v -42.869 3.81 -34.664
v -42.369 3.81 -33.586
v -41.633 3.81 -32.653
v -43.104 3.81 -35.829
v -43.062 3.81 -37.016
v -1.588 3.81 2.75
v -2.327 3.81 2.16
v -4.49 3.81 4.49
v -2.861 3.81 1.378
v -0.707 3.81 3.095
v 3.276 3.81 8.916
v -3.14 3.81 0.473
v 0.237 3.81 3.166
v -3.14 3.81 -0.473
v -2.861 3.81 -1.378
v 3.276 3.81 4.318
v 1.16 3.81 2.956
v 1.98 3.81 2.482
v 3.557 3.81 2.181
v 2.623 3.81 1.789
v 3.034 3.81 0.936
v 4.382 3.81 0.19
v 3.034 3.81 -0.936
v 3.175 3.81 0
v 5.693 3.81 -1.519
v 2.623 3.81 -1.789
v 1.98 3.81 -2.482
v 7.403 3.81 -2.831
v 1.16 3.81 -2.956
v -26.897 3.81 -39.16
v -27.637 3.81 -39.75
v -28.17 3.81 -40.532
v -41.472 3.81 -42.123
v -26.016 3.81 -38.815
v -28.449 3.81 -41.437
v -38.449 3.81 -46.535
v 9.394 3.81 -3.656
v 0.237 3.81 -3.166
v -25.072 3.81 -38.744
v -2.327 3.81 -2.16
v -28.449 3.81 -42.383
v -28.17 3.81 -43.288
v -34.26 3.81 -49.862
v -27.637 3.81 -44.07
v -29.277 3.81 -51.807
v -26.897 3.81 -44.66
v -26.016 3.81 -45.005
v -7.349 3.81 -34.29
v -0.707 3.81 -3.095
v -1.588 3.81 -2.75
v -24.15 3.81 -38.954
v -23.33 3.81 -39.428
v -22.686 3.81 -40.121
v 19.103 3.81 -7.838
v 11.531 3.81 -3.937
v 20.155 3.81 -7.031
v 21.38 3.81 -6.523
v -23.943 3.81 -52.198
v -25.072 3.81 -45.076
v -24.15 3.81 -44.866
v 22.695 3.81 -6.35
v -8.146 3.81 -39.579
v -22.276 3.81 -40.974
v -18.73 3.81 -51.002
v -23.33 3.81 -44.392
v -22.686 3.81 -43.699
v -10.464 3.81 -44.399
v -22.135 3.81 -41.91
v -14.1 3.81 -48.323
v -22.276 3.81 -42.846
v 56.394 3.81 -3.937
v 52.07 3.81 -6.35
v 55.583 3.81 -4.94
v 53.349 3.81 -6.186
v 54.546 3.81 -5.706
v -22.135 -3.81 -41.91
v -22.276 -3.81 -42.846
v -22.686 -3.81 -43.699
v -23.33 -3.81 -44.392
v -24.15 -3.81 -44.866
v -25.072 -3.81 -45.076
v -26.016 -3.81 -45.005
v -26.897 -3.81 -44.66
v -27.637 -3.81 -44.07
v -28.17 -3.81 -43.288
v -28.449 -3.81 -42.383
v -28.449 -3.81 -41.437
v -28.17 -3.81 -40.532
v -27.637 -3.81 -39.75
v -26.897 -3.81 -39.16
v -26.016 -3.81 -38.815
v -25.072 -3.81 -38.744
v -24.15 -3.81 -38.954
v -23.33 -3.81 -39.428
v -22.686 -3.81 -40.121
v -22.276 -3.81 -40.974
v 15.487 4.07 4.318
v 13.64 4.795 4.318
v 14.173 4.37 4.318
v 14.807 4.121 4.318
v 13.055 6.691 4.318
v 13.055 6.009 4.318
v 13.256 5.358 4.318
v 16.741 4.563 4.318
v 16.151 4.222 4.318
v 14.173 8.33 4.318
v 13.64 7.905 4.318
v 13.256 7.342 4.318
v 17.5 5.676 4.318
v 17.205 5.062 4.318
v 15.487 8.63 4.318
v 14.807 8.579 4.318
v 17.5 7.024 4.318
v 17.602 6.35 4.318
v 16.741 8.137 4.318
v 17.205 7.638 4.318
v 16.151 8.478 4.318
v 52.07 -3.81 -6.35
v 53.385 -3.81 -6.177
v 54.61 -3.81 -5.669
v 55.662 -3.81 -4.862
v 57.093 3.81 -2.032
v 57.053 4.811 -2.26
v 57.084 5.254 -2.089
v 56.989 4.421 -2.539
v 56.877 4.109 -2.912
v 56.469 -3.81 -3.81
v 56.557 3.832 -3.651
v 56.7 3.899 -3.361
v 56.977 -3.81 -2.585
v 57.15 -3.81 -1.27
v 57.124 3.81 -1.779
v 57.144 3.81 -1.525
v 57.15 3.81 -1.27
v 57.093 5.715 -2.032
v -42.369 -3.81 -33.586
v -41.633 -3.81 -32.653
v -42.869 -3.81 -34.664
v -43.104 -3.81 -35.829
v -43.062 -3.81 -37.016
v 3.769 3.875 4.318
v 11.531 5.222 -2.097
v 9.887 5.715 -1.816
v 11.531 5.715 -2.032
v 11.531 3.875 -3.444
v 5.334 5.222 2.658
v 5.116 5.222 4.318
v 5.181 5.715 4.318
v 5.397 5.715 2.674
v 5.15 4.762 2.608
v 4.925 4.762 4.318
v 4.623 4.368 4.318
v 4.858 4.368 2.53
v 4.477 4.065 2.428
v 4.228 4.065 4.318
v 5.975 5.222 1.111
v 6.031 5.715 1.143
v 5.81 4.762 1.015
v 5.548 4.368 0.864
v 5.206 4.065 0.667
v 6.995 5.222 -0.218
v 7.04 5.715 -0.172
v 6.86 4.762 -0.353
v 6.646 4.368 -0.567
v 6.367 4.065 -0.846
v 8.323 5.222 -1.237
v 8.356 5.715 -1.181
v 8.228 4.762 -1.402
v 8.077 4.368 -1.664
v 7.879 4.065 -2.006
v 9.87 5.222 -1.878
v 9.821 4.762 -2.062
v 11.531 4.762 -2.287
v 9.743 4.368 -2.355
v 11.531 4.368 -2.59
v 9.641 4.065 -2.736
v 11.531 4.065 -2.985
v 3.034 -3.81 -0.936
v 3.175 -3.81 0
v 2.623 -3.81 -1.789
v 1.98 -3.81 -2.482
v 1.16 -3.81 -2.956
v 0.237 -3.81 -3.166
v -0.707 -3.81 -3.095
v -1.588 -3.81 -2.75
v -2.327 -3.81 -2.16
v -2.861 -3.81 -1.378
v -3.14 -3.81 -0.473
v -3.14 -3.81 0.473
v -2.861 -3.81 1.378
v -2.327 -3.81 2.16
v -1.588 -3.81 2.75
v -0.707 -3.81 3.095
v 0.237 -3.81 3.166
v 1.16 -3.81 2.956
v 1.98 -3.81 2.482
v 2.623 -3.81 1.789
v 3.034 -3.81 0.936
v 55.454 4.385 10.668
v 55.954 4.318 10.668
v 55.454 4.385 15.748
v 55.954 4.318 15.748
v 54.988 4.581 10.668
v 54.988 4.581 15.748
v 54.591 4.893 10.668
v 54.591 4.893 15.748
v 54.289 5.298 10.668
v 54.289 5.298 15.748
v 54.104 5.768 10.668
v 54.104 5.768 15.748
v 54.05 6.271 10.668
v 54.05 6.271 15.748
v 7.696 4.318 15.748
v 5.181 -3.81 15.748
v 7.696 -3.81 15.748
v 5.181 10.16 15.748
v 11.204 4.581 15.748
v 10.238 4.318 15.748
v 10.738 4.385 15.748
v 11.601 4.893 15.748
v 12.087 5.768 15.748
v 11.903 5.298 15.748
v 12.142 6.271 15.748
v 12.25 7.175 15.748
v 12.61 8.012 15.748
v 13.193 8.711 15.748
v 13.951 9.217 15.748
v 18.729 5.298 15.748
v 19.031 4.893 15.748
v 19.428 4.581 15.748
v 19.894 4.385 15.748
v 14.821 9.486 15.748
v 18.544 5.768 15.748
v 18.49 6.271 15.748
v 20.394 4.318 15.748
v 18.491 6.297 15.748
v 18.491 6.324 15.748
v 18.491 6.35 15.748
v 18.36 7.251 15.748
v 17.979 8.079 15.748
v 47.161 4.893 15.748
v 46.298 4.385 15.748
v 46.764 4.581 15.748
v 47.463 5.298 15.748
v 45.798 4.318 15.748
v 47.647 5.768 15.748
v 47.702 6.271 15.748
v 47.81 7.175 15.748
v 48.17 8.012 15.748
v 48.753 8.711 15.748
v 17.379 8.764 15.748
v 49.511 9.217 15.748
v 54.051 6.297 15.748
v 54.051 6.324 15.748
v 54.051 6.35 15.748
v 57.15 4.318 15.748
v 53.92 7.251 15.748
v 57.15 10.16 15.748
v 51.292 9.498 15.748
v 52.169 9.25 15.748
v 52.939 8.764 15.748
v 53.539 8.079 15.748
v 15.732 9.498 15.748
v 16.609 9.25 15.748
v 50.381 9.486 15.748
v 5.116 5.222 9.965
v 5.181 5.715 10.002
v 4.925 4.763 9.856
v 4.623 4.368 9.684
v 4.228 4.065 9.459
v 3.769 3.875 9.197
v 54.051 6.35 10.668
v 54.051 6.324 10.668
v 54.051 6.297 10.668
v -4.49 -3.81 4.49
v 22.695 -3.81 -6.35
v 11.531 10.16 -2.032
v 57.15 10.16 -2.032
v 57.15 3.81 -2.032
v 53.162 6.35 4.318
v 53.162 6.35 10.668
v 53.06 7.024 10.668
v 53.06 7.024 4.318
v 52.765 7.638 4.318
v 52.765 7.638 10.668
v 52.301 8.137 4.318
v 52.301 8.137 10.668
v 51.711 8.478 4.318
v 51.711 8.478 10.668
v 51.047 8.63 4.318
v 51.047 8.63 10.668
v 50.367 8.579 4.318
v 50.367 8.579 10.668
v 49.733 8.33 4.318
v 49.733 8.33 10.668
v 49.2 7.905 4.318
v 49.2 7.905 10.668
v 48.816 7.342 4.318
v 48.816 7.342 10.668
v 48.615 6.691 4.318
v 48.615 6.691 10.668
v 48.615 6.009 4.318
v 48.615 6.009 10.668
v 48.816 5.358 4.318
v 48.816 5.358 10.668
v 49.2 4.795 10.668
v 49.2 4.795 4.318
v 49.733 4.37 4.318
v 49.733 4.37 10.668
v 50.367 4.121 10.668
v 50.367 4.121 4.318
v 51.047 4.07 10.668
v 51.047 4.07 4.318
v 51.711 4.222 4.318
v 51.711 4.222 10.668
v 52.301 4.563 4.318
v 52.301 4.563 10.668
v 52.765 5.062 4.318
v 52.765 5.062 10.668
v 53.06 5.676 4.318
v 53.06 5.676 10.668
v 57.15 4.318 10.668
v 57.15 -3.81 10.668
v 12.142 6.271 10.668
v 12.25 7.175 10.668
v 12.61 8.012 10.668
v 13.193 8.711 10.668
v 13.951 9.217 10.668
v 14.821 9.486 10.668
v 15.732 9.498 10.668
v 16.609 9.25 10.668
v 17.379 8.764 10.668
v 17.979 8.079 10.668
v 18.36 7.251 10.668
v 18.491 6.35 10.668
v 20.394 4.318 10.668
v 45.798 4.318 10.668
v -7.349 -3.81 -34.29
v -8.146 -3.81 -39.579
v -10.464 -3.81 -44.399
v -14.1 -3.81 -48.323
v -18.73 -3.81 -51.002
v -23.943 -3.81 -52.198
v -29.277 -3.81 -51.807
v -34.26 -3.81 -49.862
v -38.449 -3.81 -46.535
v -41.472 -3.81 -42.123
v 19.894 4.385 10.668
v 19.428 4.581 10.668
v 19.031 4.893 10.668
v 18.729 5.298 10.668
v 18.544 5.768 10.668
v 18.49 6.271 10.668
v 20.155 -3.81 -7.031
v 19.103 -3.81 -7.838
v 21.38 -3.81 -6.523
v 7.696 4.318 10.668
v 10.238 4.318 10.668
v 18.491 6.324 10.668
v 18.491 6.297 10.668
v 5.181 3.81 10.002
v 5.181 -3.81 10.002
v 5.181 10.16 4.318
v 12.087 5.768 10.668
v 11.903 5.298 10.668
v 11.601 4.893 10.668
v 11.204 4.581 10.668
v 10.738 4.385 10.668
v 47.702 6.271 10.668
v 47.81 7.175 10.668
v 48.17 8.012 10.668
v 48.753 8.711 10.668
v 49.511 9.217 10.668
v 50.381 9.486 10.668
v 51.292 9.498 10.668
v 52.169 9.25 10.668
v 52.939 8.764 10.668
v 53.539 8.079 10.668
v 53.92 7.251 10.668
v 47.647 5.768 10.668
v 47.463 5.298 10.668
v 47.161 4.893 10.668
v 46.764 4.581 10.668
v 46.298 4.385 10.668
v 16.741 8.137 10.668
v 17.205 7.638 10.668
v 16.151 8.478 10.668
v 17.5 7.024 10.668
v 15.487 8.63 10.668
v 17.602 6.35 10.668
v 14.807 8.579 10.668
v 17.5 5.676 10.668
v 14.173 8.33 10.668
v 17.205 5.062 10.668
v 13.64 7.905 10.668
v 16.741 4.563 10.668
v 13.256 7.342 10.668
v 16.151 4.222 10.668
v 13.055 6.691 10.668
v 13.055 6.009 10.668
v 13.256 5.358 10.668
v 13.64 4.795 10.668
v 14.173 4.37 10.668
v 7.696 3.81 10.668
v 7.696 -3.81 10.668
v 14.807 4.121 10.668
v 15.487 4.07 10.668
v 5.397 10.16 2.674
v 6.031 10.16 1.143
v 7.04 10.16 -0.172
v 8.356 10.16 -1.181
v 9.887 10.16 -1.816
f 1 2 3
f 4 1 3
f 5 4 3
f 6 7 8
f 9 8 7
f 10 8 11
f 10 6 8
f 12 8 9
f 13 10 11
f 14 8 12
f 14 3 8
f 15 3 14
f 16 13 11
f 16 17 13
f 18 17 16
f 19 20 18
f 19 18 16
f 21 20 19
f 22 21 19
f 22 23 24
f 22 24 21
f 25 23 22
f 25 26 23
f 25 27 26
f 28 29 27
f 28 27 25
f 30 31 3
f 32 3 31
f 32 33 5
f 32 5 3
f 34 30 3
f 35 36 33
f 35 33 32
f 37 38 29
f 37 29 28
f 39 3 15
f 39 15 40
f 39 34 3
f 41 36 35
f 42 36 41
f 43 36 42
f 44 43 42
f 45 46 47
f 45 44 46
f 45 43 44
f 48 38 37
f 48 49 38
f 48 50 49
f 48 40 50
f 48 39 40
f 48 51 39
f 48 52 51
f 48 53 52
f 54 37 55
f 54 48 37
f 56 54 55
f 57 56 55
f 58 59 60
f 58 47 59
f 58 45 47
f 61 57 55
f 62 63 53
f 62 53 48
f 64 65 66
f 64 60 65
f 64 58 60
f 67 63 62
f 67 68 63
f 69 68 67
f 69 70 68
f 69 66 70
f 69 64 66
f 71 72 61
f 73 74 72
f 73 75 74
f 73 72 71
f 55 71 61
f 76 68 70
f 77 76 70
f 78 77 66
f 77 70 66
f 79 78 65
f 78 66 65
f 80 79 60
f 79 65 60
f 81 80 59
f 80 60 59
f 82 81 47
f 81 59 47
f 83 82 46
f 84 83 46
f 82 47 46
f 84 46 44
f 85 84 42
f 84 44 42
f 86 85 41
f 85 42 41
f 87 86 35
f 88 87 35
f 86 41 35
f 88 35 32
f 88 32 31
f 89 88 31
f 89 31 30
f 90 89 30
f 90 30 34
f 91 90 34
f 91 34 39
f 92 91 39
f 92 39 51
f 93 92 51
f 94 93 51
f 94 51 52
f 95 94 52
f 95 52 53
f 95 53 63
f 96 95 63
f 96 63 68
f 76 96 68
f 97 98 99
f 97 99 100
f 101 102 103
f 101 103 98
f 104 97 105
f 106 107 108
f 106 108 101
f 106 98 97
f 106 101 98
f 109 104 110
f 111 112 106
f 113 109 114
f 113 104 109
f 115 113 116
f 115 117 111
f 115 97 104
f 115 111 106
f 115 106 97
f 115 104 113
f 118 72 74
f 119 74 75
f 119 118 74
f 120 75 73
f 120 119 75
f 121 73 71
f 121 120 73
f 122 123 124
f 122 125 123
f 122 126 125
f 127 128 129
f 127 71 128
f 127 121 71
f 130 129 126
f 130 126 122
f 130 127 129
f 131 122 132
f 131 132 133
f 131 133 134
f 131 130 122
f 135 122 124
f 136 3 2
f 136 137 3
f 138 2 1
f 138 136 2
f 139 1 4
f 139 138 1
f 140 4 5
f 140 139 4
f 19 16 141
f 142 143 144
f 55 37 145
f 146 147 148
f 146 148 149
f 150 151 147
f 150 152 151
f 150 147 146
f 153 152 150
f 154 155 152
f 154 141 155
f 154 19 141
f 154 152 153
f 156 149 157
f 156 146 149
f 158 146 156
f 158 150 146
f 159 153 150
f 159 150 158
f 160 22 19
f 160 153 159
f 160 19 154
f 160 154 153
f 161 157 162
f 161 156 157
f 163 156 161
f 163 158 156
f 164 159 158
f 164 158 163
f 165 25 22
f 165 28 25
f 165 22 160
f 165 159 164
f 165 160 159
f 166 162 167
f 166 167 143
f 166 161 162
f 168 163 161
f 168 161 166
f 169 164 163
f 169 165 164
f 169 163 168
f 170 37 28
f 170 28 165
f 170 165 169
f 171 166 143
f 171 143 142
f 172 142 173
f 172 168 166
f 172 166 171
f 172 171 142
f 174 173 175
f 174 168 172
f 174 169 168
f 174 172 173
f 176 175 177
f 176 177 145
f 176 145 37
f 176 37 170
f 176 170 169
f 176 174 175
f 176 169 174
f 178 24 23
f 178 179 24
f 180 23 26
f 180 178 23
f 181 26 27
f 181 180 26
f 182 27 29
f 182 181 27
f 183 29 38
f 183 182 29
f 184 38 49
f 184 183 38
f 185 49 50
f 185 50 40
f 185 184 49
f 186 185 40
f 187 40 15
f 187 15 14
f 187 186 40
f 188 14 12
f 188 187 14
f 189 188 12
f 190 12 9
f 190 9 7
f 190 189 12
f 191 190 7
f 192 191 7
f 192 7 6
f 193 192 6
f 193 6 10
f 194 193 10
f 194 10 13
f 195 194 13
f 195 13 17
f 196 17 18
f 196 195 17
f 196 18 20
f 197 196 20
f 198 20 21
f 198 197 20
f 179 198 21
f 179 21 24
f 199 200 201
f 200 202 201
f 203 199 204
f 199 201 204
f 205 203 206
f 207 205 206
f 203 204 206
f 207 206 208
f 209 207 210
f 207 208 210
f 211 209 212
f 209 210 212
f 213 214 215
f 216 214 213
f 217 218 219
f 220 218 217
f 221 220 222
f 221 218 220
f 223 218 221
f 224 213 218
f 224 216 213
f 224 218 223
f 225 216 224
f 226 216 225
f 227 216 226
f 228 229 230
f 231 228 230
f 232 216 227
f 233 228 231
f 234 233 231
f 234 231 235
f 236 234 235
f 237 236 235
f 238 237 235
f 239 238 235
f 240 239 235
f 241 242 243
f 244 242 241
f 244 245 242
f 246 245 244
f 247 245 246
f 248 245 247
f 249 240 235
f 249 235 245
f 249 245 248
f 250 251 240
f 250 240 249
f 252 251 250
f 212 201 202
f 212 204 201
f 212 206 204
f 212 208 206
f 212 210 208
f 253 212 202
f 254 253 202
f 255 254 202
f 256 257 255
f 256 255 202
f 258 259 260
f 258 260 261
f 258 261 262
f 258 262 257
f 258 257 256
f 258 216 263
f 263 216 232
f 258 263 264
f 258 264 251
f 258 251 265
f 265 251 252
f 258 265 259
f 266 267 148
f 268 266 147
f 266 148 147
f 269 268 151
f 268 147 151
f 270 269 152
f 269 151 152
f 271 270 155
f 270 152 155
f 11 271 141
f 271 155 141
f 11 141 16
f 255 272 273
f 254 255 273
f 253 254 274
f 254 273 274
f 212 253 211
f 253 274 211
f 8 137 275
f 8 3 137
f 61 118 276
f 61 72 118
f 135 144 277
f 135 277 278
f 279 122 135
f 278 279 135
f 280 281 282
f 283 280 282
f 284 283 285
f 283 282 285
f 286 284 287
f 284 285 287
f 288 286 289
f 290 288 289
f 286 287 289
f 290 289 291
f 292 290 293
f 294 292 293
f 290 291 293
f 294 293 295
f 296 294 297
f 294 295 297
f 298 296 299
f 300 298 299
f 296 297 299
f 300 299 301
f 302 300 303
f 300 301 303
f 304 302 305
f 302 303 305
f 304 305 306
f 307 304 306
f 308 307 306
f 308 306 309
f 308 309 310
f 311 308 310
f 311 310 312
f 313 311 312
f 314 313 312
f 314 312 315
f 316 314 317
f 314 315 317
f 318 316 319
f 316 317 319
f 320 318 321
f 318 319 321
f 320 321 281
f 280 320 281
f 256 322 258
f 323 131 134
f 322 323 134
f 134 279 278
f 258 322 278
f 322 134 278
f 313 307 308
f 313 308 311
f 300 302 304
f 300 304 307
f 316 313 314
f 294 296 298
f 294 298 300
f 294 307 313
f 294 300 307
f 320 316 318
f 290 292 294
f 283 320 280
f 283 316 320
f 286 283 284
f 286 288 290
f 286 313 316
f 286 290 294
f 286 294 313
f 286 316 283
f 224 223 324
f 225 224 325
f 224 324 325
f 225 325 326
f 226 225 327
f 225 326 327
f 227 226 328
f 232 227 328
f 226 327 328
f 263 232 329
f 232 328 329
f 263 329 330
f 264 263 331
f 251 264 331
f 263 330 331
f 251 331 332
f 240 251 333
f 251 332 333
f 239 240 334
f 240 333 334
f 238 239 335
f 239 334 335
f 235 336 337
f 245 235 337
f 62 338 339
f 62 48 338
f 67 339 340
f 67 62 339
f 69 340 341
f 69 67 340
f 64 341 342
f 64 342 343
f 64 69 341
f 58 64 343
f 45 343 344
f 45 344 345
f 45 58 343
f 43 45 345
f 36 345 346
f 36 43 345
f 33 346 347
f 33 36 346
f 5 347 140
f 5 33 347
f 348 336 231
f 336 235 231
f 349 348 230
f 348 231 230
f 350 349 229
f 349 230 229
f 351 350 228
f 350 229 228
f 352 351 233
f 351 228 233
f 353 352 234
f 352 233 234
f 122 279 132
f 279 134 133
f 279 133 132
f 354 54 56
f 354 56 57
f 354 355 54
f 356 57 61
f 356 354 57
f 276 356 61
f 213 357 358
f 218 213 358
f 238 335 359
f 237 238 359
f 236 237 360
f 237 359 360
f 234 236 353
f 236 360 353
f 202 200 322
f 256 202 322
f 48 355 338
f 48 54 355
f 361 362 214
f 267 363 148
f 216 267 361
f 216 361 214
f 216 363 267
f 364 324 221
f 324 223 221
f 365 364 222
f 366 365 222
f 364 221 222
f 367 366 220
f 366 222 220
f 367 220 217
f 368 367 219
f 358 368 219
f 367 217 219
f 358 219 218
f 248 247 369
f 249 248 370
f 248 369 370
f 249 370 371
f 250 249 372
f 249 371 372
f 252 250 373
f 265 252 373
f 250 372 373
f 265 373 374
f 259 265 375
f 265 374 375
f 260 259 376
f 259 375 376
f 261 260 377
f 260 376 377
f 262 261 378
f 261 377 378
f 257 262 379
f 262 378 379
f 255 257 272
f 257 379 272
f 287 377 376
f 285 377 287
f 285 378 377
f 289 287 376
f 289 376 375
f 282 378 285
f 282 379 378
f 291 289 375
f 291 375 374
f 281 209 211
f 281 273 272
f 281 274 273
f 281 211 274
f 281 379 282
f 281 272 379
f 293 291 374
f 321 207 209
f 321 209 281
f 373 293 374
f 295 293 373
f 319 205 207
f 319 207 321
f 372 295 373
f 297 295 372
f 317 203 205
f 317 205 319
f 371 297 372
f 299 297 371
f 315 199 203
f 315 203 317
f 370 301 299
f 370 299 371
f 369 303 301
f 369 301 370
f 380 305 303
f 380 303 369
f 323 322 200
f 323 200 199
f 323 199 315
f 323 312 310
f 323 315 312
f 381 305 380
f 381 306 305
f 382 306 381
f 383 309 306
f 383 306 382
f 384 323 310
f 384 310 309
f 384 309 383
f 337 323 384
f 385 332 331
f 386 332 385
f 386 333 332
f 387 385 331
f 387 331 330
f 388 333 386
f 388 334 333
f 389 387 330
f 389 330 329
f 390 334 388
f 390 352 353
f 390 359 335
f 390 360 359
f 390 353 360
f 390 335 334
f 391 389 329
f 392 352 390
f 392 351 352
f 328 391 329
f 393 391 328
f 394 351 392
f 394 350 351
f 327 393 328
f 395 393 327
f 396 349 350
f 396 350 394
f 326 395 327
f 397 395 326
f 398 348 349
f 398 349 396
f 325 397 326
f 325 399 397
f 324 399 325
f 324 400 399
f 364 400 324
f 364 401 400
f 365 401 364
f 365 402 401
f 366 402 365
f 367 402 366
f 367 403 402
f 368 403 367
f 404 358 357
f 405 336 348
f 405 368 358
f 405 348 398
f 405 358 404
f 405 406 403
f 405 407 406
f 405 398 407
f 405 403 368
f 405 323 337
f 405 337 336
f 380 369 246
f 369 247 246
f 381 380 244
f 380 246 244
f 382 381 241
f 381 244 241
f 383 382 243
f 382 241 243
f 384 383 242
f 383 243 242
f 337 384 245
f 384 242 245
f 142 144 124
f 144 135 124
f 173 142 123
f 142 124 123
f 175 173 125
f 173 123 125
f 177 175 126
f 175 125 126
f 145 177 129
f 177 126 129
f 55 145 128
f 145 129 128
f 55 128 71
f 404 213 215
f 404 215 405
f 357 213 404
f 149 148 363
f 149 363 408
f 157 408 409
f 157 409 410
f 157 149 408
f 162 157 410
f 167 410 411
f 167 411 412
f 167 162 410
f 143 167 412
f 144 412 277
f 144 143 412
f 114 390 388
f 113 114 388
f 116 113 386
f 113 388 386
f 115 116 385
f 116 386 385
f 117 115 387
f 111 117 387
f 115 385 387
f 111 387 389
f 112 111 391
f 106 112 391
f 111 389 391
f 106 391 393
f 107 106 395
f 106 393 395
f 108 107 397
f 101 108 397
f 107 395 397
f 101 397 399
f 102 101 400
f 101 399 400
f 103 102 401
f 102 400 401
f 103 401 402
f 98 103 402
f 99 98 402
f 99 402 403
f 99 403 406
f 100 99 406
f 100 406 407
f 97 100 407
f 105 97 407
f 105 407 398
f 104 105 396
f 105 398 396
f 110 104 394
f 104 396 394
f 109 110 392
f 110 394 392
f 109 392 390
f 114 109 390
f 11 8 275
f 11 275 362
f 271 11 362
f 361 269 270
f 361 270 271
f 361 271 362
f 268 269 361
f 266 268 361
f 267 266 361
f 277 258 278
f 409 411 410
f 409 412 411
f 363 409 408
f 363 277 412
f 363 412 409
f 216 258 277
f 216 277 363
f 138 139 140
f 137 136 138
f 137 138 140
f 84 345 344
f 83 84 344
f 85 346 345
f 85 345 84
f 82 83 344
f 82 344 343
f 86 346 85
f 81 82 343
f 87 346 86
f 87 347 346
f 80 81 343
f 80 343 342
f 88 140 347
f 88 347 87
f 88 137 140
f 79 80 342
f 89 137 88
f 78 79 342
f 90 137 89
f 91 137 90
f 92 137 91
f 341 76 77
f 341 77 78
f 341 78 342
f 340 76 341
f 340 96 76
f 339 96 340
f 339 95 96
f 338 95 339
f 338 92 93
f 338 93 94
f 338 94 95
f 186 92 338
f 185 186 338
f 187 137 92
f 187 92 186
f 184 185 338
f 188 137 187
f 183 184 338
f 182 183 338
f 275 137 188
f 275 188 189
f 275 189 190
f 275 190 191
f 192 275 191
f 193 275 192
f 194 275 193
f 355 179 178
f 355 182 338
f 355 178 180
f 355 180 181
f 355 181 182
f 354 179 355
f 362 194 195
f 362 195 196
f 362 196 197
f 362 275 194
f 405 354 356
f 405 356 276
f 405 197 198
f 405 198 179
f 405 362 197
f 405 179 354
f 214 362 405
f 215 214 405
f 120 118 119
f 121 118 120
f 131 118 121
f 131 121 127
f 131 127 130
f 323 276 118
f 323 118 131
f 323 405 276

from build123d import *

# Parameters (mm, degrees)
SKETCH1_R                       = 3.175
BOSS_EXTRUDE1_DEPTH             = 3.81
FILLET1_R                       = 5.08
SKETCH3_R                       = 3.175
CUT_EXTRUDE2_DEPTH              = 8.62
BOSS_EXTRUDE2_DEPTH             = 6.35
SKETCH6_R                       = 2.286
CUT_EXTRUDE3_DEPTH              = 6.35
BOSS_EXTRUDE3_DEPTH             = 5.08
FILLET2_R                       = 1.905
FILLET3_R                       = 1.905
BOSS_EXTRUDE4_REACH             = 8.35
BOSS_EXTRUDE4_DIRECTION_2_REACH = 9.62


with BuildPart() as part:
    # Sketch1 → Boss-Extrude1 (new body, symmetric)
    with BuildSketch(Plane(origin=(0, 0, 0), x_dir=(1, 0, 0), z_dir=(0, 1, 0))):
        with BuildLine():
            Line((-43.270256121, 34.29), (-4.490128061, -4.490128061))
            Line((-4.490128061, -4.490128061), (6.35, -10.668))
            Line((6.35, -10.668), (57.15, -10.668))
            Line((57.15, -10.668), (57.15, 6.35))
            Line((57.15, 6.35), (20.590768363, 6.35))
            Line((20.590768363, 6.35), (-7.349231637, 34.29))
            ThreePointArc((-7.349231637, 34.29), (-25.309743879, 52.250512242), (-43.270256121, 34.29))
        make_face()
        Circle(SKETCH1_R, mode=Mode.SUBTRACT)
    extrude(amount=BOSS_EXTRUDE1_DEPTH, both=True)

    # Fillet1
    fillet1_edges = [part.edges().sort_by_distance(p)[0] for p in [
        (-43.270256121, 0, -34.29),
        (20.590768363, 0, -6.35),
        (57.15, 0, -6.35),
        (6.35, 0, 10.668),
    ]]
    fillet(fillet1_edges, radius=FILLET1_R)

    # Sketch3 → Cut-Extrude2 (cut, through all)
    with BuildSketch(Plane(origin=(0, 3.81, 0), x_dir=(1, 0, 0), z_dir=(0, 1, 0))):
        with Locations((-25.309743879, 41.91)):
            Circle(SKETCH3_R)
    extrude(amount=-CUT_EXTRUDE2_DEPTH, mode=Mode.SUBTRACT)

    # Sketch4 → Boss-Extrude2 (add)
    with BuildSketch(Plane(origin=(0, 3.81, 0), x_dir=(1, 0, 0), z_dir=(0, 1, 0))):
        with BuildLine():
            Line((57.15, -10.668), (7.695948183, -10.668))
            ThreePointArc((7.695948183, -10.668), (6.394891779, -10.498565368), (5.180624356, -10.001563871))
            Line((5.180624356, -10.001563871), (5.180624356, -4.318))
            ThreePointArc((5.180624356, -4.318), (7.040496295, 0.172128061), (11.530624356, 2.032))
            Line((11.530624356, 2.032), (57.15, 2.032))
            Line((57.15, 2.032), (57.15, -10.668))
        make_face()
    extrude(amount=BOSS_EXTRUDE2_DEPTH)

    # Sketch6 → Cut-Extrude3 (cut)
    with BuildSketch(Plane.XY.offset(10.668)):
        with Locations((15.315948183, 6.35)):
            Circle(SKETCH6_R)
        with Locations((50.875948183, 6.35)):
            Circle(SKETCH6_R)
    extrude(amount=-CUT_EXTRUDE3_DEPTH, mode=Mode.SUBTRACT)

    # Sketch7 → Boss-Extrude3 (add)
    with BuildSketch(Plane.XY.offset(10.668)):
        with BuildLine():
            Line((57.15, 10.16), (7.695948183, 10.16))
            Line((7.695948183, 10.16), (7.695948183, 4.318))
            Line((7.695948183, 4.318), (12.876357848, 4.318))
            ThreePointArc((12.876357848, 4.318), (14.235456237, 9.335491945), (18.490948183, 6.35))
            ThreePointArc((18.490948183, 6.35), (18.301440128, 5.269508055), (17.755538517, 4.318))
            Line((17.755538517, 4.318), (48.436357848, 4.318))
            ThreePointArc((48.436357848, 4.318), (49.795456237, 9.335491945), (54.050948183, 6.35))
            ThreePointArc((54.050948183, 6.35), (53.861440128, 5.269508055), (53.315538517, 4.318))
            Line((53.315538517, 4.318), (57.15, 4.318))
            Line((57.15, 4.318), (57.15, 10.16))
        make_face()
    extrude(amount=BOSS_EXTRUDE3_DEPTH)

    # Fillet2
    fillet2_edges = [part.edges().sort_by_distance(p)[0] for p in [
        (53.315538517, 4.318, 13.208),
        (12.876357848, 4.318, 13.208),
        (17.755538517, 4.318, 13.208),
        (48.436357848, 4.318, 13.208),
    ]]
    fillet(fillet2_edges, radius=FILLET2_R)

    # Fillet3
    fillet3_edges = [part.edges().sort_by_distance(p)[0] for p in [
        (34.31157461, 3.81, -2.032),
        (7.040496295, 3.81, -0.172128061),
        (5.180624356, 3.81, 7.159781936),
    ]]
    fillet(fillet3_edges, radius=FILLET3_R)

    # Boss-Extrude4: up to this face of the body (flat: up to its plane)
    boss_extrude4_end = Plane(part.part.faces().sort_by_distance((31.766522001, 10.16, 6.837548853))[0])
    # Sketch8 → Boss-Extrude4 (add, up to the picked face)
    with BuildSketch(Plane(origin=(0, 3.81, 0), x_dir=(1, 0, 0), z_dir=(0, 1, 0)), mode=Mode.PRIVATE) as boss_extrude4_sk1:
        with BuildLine():
            Line((5.180624356, -15.748), (7.695948183, -15.748))
            Line((7.695948183, -15.748), (7.695948183, -10.668))
            ThreePointArc((7.695948183, -10.668), (6.394891779, -10.498565368), (5.180624356, -10.001563871))
            Line((5.180624356, -10.001563871), (5.180624356, -15.748))
        make_face()
    boss_extrude4_tool1 = split(extrude(boss_extrude4_sk1.sketch, amount=BOSS_EXTRUDE4_REACH, mode=Mode.PRIVATE), bisect_by=boss_extrude4_end, keep=Keep.BOTH, mode=Mode.PRIVATE)
    add(boss_extrude4_tool1.solids().sort_by_distance((6.412294, 3.81, 13.096367))[0])

    # Boss-Extrude4 direction 2: up to this face of the body (flat: up to its plane)
    boss_extrude4_direction_2_end = Plane(part.part.faces().sort_by_distance((1.392944323, -3.81, -15.281162376))[0])
    # Sketch8 → Boss-Extrude4 direction 2 (add, up to the picked face)
    with BuildSketch(Plane(origin=(0, 3.81, 0), x_dir=(1, 0, 0), z_dir=(0, 1, 0)), mode=Mode.PRIVATE) as boss_extrude4_direction_2_sk1:
        with BuildLine():
            Line((5.180624356, -15.748), (7.695948183, -15.748))
            Line((7.695948183, -15.748), (7.695948183, -10.668))
            ThreePointArc((7.695948183, -10.668), (6.394891779, -10.498565368), (5.180624356, -10.001563871))
            Line((5.180624356, -10.001563871), (5.180624356, -15.748))
        make_face()
    boss_extrude4_direction_2_tool1 = split(extrude(boss_extrude4_direction_2_sk1.sketch, amount=-BOSS_EXTRUDE4_DIRECTION_2_REACH, mode=Mode.PRIVATE), bisect_by=boss_extrude4_direction_2_end, keep=Keep.BOTH, mode=Mode.PRIVATE)
    add(boss_extrude4_direction_2_tool1.solids().sort_by_distance((6.412294, 3.81, 13.096367))[0])


solid = part.part
